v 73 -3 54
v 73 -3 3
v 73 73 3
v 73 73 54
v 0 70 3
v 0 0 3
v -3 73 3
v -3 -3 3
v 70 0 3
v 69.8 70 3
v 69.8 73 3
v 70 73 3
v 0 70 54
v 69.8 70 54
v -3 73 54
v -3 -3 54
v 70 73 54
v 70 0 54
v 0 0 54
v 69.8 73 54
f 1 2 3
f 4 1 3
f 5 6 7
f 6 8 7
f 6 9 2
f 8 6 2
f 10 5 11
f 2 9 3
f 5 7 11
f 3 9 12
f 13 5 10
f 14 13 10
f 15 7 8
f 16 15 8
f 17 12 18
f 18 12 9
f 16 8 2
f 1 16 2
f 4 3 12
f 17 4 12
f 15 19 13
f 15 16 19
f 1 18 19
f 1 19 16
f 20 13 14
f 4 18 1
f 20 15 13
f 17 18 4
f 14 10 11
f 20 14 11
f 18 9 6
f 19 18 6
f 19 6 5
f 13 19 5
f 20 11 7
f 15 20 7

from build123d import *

# Parameters (mm, degrees)
F1_START = 3
F1_DEPTH = 51


with BuildPart() as f1:
    # F0 (on Top) → F1 (new body)
    with BuildSketch(Plane.XY.offset(F1_START)):
        Polygon((0, 0), (0, 70), (69.8, 70), (69.8, 73), (-3, 73), (-3, -3), (73, -3), (73, 73), (70, 73), (70, 70), (70, 0), align=None)
    extrude(amount=F1_DEPTH)


solid = f1.part
